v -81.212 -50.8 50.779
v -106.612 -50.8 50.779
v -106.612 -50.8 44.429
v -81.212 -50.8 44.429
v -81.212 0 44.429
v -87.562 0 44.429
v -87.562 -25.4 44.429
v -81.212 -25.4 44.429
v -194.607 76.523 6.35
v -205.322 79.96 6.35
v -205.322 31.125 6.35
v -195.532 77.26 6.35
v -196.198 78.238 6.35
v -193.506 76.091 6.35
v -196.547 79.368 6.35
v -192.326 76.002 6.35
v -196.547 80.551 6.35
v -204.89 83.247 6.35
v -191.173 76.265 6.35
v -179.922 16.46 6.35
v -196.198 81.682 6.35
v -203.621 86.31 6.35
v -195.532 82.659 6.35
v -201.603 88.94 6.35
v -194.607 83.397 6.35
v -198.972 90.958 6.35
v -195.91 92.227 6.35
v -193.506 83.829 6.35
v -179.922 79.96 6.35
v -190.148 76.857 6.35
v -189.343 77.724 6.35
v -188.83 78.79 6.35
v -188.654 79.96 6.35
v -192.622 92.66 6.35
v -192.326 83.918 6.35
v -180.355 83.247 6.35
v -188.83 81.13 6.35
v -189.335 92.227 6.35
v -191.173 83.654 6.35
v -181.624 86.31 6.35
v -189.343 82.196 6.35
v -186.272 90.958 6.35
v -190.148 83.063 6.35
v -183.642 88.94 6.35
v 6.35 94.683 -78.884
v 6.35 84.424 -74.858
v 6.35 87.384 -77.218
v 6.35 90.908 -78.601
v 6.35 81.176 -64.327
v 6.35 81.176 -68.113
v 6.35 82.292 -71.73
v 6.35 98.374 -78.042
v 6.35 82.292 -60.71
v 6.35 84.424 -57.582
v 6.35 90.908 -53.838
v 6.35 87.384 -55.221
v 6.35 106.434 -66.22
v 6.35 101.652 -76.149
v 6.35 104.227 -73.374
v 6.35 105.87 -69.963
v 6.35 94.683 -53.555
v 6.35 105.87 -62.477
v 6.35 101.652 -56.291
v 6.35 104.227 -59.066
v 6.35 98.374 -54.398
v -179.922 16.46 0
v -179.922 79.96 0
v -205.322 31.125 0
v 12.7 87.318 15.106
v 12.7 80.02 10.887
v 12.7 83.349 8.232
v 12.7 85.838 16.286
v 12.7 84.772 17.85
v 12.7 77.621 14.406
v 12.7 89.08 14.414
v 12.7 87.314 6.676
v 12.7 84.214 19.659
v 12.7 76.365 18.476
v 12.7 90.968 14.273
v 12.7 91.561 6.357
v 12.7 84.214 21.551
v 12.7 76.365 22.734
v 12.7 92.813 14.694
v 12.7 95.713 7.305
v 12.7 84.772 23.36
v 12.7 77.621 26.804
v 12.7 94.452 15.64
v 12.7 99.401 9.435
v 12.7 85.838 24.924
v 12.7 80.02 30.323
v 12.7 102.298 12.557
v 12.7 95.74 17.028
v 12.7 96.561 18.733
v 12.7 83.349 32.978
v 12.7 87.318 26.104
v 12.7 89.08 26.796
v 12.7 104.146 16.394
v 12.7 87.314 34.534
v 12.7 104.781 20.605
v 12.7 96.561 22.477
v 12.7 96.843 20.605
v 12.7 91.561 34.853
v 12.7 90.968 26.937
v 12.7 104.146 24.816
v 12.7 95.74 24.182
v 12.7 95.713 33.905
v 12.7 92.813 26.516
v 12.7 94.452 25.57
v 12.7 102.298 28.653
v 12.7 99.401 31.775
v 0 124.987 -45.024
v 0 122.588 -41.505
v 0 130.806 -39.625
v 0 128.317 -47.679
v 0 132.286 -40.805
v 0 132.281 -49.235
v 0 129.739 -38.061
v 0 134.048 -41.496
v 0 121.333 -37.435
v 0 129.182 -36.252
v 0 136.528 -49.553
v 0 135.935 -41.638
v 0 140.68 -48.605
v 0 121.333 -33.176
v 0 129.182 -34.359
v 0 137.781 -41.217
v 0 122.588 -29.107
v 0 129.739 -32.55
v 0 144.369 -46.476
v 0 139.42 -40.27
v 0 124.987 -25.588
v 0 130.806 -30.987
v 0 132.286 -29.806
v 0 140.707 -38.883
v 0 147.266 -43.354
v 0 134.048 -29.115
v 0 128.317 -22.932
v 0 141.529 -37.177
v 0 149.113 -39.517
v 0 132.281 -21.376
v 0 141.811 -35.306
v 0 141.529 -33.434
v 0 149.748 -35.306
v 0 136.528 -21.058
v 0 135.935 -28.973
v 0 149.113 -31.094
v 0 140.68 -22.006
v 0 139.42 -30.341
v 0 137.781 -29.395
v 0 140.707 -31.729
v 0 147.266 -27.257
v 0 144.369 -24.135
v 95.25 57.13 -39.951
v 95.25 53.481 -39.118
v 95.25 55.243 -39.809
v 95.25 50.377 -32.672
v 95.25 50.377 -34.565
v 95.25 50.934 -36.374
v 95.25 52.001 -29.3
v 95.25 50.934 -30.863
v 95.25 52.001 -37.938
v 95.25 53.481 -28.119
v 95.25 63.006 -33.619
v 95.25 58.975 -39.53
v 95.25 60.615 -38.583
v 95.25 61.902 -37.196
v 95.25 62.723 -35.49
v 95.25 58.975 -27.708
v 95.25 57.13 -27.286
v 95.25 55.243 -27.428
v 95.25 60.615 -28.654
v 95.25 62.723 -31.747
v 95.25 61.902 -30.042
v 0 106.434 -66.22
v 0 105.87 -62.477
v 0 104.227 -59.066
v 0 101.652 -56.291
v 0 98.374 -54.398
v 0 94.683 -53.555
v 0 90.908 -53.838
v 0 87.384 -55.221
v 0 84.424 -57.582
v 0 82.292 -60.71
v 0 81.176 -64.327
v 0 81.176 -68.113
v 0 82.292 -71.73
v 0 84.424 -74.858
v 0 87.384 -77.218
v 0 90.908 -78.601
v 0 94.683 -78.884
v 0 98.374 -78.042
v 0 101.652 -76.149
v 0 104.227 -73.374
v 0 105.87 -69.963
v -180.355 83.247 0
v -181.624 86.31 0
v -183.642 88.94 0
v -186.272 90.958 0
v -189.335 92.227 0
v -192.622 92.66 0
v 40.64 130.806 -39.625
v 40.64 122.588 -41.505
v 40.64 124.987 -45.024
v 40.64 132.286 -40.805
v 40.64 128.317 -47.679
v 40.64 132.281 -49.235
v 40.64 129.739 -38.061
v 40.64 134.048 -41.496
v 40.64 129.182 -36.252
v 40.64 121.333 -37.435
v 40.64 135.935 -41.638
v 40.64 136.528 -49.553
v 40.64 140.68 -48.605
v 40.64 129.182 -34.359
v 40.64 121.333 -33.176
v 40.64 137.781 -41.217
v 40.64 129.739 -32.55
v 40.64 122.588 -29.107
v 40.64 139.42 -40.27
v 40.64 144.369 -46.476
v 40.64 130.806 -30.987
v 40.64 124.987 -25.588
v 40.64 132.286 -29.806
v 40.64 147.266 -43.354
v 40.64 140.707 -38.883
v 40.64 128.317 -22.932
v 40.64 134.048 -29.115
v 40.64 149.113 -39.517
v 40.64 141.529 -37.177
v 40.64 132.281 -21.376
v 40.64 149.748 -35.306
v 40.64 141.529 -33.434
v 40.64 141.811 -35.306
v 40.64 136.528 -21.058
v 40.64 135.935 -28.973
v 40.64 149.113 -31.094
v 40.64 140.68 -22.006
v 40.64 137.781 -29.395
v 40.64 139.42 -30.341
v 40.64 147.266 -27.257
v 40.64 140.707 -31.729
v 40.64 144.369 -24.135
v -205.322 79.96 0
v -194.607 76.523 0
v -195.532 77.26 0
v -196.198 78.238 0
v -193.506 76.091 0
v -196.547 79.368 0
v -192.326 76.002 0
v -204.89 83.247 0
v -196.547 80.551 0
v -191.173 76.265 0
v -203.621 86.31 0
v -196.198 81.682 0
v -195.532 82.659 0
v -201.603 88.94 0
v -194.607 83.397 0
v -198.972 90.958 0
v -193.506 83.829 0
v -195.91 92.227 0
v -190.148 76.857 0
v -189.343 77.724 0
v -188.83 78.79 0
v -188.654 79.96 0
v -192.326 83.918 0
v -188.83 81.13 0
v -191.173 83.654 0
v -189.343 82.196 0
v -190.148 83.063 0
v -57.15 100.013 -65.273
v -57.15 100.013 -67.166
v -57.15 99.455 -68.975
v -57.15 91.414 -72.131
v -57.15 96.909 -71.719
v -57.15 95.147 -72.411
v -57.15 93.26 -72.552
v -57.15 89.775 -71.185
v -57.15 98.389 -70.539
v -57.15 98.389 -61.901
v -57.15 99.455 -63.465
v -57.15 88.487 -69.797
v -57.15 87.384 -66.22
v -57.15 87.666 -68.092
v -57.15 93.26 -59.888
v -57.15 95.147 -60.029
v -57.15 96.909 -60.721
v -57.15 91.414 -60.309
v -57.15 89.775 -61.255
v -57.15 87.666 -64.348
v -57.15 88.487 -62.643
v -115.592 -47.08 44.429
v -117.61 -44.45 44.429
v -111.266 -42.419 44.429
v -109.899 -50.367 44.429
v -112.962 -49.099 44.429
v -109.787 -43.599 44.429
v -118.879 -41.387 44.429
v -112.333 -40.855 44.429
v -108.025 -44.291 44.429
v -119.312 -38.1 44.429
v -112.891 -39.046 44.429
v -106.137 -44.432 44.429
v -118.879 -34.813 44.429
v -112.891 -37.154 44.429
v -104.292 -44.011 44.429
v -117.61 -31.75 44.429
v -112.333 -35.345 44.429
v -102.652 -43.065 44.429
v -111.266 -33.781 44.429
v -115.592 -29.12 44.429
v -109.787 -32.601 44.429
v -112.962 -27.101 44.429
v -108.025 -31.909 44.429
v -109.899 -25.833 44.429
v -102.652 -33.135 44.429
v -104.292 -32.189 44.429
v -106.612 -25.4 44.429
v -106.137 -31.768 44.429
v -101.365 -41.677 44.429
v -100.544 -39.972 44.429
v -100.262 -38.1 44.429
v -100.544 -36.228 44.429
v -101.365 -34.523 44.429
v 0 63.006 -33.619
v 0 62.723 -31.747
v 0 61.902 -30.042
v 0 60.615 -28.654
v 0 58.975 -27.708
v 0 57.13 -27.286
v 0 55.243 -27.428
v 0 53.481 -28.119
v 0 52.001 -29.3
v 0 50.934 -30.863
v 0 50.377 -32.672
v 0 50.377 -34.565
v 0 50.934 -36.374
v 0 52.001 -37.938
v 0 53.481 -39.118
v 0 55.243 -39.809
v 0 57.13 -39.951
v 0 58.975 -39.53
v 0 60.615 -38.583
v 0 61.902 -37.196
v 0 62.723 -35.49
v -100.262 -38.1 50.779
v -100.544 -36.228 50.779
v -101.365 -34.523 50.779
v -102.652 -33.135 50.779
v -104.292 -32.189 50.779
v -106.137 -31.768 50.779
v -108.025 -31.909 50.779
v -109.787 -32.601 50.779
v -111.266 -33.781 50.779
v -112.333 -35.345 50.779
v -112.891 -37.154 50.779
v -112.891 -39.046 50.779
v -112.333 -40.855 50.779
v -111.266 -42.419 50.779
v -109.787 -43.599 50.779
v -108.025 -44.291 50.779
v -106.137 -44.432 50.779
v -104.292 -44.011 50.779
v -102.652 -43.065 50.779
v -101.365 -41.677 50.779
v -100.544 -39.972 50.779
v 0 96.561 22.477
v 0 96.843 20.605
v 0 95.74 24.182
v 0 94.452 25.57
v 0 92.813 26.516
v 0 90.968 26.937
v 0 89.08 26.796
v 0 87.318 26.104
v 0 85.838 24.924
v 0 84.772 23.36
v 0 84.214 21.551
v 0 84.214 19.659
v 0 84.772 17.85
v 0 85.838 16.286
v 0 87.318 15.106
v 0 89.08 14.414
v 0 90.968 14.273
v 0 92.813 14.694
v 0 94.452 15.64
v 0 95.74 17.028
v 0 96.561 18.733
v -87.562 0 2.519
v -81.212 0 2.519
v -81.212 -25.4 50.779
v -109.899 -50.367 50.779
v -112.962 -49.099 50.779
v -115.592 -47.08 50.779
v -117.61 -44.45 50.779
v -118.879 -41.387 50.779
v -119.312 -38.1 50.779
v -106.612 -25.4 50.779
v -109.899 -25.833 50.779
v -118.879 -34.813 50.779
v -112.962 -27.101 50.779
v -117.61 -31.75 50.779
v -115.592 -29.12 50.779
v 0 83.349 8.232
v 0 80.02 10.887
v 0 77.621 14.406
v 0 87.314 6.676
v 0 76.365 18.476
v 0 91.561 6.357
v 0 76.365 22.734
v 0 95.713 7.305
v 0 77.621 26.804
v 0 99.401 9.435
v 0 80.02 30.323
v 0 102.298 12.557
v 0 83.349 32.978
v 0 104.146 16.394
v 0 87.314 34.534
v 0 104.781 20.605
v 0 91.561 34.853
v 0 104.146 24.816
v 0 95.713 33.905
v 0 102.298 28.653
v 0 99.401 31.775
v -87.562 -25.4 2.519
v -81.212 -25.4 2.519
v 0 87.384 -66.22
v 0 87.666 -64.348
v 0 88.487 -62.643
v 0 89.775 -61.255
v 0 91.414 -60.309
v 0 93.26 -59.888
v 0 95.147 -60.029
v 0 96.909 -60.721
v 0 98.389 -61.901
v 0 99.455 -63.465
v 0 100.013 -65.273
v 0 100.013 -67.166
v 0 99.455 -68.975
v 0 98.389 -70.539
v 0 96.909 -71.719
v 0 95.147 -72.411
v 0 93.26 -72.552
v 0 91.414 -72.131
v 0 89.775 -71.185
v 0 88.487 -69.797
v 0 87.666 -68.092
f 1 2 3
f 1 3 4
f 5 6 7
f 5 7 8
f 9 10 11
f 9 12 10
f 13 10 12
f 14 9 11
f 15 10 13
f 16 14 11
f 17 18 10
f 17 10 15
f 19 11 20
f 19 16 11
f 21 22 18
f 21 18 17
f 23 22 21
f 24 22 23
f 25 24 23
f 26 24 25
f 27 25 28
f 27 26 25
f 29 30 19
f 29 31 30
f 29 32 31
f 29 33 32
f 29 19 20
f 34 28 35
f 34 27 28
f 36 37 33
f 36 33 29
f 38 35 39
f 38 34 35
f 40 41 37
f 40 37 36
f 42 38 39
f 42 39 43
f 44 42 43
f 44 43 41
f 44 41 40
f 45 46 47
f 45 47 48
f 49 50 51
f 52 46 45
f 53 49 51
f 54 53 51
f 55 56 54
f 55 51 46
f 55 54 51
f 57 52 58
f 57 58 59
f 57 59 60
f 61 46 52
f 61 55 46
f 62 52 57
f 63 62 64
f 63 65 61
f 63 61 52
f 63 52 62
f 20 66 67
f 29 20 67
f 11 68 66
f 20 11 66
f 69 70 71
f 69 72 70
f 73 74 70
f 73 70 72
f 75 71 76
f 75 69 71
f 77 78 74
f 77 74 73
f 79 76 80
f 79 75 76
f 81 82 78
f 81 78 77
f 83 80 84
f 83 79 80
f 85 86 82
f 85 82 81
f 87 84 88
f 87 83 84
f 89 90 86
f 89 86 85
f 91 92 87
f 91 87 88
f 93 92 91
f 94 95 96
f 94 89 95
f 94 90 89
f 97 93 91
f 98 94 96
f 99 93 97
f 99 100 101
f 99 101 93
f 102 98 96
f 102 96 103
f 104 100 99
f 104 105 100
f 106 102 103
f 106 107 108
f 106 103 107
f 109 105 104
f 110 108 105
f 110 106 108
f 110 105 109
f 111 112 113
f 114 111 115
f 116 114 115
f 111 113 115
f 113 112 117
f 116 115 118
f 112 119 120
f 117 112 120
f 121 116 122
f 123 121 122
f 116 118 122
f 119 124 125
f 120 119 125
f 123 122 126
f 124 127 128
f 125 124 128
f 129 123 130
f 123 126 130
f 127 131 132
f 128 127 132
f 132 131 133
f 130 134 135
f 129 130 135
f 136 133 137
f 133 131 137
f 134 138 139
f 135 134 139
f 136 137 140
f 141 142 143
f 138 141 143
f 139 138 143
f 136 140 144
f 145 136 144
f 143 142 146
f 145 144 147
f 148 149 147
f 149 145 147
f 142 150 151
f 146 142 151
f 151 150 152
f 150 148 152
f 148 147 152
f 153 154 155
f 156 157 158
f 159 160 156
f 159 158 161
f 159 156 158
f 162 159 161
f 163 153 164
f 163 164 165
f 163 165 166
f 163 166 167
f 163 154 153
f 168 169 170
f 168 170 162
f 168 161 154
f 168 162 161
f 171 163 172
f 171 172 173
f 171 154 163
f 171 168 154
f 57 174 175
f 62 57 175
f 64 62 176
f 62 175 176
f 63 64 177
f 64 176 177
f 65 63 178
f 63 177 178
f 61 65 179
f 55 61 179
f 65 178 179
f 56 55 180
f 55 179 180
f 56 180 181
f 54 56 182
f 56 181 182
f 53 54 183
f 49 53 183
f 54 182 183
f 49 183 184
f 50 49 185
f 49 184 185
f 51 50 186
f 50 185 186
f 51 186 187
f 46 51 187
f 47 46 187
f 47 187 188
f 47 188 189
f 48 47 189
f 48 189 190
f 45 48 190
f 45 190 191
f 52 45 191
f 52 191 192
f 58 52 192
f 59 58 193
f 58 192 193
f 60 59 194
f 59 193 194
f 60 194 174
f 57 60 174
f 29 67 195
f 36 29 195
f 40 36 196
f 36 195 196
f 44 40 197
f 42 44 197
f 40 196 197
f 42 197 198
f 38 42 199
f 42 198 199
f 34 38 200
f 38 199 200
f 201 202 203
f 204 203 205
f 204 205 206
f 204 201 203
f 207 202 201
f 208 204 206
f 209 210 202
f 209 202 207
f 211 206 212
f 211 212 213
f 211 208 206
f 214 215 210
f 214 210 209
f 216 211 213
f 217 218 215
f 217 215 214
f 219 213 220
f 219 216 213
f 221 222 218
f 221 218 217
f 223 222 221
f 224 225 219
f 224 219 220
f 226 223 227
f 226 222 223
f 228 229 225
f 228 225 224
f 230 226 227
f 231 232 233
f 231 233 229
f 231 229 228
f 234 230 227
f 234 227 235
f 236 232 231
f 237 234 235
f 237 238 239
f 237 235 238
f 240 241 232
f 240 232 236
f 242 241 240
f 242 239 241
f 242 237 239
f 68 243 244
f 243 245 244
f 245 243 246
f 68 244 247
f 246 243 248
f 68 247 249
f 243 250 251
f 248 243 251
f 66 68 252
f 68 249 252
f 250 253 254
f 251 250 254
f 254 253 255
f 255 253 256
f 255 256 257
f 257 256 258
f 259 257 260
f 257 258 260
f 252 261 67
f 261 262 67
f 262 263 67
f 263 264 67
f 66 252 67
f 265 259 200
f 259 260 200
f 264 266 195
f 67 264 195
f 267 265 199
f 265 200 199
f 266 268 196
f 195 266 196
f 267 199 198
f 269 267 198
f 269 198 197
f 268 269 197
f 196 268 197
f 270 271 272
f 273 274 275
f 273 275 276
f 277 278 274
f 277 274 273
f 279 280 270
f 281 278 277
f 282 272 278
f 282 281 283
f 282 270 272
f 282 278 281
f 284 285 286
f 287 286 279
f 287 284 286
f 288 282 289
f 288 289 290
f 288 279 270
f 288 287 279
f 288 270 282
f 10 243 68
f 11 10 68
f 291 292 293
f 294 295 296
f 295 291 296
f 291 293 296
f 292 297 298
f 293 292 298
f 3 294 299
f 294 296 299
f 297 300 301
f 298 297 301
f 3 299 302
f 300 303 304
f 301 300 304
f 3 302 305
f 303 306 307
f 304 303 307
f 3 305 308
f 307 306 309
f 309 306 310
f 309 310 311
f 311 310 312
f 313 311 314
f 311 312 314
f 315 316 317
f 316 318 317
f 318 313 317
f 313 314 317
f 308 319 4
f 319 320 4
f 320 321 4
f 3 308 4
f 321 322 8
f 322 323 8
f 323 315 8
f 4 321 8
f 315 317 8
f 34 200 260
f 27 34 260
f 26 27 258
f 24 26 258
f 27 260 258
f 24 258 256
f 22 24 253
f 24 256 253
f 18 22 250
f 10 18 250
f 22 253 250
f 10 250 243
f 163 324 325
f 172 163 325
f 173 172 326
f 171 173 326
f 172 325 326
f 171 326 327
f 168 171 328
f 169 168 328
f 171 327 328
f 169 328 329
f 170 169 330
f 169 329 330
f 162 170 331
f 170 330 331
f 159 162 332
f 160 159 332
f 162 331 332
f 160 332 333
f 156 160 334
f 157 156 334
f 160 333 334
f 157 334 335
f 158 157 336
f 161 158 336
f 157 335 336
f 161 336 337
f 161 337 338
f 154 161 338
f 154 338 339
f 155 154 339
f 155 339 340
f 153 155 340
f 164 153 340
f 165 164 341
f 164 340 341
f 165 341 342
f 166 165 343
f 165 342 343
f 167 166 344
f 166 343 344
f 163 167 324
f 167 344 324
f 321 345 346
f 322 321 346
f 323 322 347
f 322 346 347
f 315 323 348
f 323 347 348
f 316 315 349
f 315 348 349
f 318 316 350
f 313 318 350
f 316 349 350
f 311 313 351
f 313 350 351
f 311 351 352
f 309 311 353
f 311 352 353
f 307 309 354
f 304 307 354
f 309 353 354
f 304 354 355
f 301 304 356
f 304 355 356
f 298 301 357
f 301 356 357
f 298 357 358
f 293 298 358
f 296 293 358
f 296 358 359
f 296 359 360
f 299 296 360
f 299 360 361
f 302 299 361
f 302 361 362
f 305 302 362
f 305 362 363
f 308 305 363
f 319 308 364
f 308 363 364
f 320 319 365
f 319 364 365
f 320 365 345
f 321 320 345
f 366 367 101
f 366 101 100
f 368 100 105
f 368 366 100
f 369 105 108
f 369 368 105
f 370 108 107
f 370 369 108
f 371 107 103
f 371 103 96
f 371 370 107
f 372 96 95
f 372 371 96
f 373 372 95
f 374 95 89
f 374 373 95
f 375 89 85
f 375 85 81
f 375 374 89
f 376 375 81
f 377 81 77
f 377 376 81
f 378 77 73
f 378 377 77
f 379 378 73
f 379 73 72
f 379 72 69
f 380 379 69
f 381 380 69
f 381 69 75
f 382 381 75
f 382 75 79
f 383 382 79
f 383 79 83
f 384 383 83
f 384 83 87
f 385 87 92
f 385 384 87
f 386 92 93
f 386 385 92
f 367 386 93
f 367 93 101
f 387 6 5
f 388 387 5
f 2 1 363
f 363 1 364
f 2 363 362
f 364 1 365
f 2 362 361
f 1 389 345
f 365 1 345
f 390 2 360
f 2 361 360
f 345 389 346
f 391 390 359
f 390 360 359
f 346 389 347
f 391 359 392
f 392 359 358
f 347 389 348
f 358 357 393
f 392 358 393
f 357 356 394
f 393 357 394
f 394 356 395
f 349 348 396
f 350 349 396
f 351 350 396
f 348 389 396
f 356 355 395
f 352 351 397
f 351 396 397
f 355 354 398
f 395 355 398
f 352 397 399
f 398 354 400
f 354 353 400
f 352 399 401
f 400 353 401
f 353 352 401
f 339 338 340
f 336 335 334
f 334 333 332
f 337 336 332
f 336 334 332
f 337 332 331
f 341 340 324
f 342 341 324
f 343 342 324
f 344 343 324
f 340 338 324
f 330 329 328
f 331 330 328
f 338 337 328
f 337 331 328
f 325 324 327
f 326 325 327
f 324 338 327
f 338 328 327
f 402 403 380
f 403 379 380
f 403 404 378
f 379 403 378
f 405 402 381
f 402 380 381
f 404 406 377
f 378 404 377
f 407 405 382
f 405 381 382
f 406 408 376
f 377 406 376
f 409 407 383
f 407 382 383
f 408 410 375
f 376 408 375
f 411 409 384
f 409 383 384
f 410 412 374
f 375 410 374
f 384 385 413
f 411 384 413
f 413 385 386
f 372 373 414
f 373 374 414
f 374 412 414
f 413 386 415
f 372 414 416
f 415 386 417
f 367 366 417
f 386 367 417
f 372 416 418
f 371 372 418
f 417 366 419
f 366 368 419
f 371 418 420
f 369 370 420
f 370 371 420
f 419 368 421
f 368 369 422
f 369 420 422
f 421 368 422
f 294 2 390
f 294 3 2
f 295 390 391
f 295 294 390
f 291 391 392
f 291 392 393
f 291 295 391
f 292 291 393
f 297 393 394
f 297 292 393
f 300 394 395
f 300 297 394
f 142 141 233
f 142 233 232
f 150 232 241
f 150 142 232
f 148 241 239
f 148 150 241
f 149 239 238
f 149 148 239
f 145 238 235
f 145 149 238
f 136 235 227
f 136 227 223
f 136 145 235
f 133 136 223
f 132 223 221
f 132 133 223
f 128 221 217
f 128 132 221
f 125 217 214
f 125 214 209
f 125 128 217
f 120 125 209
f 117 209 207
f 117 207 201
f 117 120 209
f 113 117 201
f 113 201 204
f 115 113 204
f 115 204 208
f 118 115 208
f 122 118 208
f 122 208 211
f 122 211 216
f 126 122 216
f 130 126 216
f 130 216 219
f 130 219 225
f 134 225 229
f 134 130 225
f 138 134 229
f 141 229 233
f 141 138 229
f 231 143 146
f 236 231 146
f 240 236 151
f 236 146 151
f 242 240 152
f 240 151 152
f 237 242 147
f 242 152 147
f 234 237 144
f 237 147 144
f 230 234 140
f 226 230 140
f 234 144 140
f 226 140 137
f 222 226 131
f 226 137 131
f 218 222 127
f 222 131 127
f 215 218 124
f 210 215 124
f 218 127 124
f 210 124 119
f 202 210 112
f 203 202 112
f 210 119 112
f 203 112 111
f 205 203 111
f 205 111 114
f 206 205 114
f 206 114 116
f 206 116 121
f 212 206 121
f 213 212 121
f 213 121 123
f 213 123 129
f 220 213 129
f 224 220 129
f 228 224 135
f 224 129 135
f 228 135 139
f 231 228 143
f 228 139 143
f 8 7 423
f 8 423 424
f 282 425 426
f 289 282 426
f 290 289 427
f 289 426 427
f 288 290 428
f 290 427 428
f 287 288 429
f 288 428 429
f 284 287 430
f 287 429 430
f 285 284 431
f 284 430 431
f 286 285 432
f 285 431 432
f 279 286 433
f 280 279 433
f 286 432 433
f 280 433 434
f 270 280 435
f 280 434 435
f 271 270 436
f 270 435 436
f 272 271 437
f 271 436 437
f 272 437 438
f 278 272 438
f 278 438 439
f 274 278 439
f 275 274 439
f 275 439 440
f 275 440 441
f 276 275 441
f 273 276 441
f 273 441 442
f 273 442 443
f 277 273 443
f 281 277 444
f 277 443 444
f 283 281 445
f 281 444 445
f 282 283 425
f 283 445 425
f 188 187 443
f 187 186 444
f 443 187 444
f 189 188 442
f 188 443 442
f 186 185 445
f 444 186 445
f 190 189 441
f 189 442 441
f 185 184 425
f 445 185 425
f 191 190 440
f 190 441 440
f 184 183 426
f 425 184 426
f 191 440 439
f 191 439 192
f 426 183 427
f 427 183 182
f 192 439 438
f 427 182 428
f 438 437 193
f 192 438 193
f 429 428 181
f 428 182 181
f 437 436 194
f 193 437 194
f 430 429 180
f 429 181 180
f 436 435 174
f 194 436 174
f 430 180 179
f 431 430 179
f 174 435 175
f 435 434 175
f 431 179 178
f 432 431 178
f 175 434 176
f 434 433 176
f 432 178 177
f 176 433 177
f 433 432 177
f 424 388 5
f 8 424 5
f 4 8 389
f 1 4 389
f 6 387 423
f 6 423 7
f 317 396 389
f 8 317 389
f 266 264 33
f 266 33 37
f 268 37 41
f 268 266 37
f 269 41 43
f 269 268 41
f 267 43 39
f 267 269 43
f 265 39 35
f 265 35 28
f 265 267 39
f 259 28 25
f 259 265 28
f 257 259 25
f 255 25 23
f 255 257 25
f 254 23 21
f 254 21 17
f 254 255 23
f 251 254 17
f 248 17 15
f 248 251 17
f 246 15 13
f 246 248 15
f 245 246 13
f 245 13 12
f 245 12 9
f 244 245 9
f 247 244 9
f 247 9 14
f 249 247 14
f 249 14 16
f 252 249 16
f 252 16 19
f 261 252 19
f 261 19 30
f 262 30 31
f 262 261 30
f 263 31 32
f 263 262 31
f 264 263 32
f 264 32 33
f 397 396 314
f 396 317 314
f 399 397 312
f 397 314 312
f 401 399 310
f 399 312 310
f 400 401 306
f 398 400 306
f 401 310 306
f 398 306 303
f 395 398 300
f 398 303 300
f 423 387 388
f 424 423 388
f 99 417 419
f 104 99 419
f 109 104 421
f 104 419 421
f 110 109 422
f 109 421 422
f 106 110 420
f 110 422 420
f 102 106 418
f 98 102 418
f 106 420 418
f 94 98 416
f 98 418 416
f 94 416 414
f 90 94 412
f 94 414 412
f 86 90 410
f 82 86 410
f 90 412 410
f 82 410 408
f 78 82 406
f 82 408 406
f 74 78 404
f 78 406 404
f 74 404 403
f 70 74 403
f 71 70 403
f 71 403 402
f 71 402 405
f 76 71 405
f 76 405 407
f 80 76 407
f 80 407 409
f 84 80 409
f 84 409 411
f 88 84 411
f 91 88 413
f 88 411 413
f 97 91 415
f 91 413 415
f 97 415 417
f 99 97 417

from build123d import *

# Parameters (mm, degrees)
F0_W      = 6.35
F0_H      = 41.91
F1_DEPTH  = 25.4
F3_DEPTH  = 25.4
F4_R      = 6.35
F5_DEPTH  = 6.35
F6_R      = 14.2875
F6_R_2    = 6.35
F7_DEPTH  = 12.7
F8_R      = 6.35
F9_DEPTH  = 95.25
F10_R     = 14.2875
F10_R_2   = 6.35
F11_DEPTH = 40.64
F12_R     = 12.7
F13_DEPTH = 6.35
F14_R     = 6.35
F15_DEPTH = 57.15
F16_R     = 3.96875
F17_DEPTH = 6.35
F18_R     = 12.69999


# Not quite as in the source:
# - a fillet or chamfer is up to 0.001 mm smaller than in the source, because OpenCascade refuses the exact size


with BuildPart() as f1:
    # F0 (on Front) → F1 (new body)
    with BuildSketch(Plane.XZ):
        with Locations((-84.3865873288, 23.4739605102)):
            Rectangle(F0_W, F0_H)
    extrude(amount=F1_DEPTH)


with BuildPart() as f3:
    # F2 (on face) → F3 (new body)
    with BuildSketch(Plane.XZ.offset(25.4)):
        Polygon((-87.5615873288, 44.4289605102), (-81.2115873288, 44.4289605102), (-81.2115873288, 50.7789605102), (-119.3115873288, 50.7789605102), (-119.3115873288, 44.4289605102), align=None)
    extrude(amount=F3_DEPTH)

    # F4 (on face) → F5 (cut, through all)
    with BuildSketch(Plane.XY.offset(50.7789605102)):
        with Locations((-106.6115873288, -38.1)):
            Circle(F4_R)
    extrude(amount=-F5_DEPTH, mode=Mode.SUBTRACT)

    # F18 (radius 12.7 in the source; OpenCascade refuses exactly that, so slightly less here)
    f18_edges = [f3.edges().sort_by_distance(p)[0] for p in [
        (-119.311587, -50.8, 47.603961),
        (-119.311587, -25.4, 47.603961),
    ]]
    fillet(f18_edges, radius=F18_R)


with BuildPart() as f7:
    # F6 (on Right) → F7 (new body)
    with BuildSketch(Plane.YZ):
        with Locations((90.4932394624, 20.6049848348)):
            Circle(F6_R)
        with Locations((90.4932394624, 20.6049848348)):
            Circle(F6_R_2, mode=Mode.SUBTRACT)
    extrude(amount=F7_DEPTH)


with BuildPart() as f9:
    # F8 (on Right) → F9 (new body)
    with BuildSketch(Plane.YZ):
        with Locations((56.6555783153, -33.6186587811)):
            Circle(F8_R)
    extrude(amount=F9_DEPTH)


with BuildPart() as f11:
    # F10 (on Right) → F11 (new body)
    with BuildSketch(Plane.YZ):
        with Locations((135.4606151581, -35.3056155145)):
            Circle(F10_R)
        with Locations((135.4606151581, -35.3056155145)):
            Circle(F10_R_2, mode=Mode.SUBTRACT)
    extrude(amount=F11_DEPTH)


with BuildPart() as f13:
    # F12 (on Right) → F13 (new body)
    with BuildSketch(Plane.YZ):
        with Locations((93.7340855598, -66.2199109793)):
            Circle(F12_R)
    extrude(amount=F13_DEPTH)

    # F14 (on face) → F15 (join)
    with BuildSketch(Plane(origin=(0, 0, 0), x_dir=(0, -1, 0), z_dir=(-1, 0, 0))):
        with Locations((-93.7340855598, -66.2199109793)):
            Circle(F14_R)
    extrude(amount=F15_DEPTH)


with BuildPart() as f17:
    # F16 (on Top) → F17 (new body)
    with BuildSketch(Plane.XY):
        with BuildLine():
            Line((-179.9224981273, 16.4599019216), (-179.9224981273, 79.9599019216))
            ThreePointArc((-179.9224981273, 79.9599019216), (-183.6422420062, 88.9401580427), (-192.6224981273, 92.6599019216))
            ThreePointArc((-192.6224981273, 92.6599019216), (-201.6027542484, 88.9401580427), (-205.3224981273, 79.9599019216))
            Line((-205.3224981273, 79.9599019216), (-205.3224981273, 31.124598759))
            Line((-205.3224981273, 31.124598759), (-179.9224981273, 16.4599019216))
        make_face()
        with Locations((-192.6224981273, 79.9599019216)):
            Circle(F16_R, mode=Mode.SUBTRACT)
    extrude(amount=F17_DEPTH)


solid = Compound([f1.part, f3.part, f7.part, f9.part, f11.part, f13.part, f17.part])
